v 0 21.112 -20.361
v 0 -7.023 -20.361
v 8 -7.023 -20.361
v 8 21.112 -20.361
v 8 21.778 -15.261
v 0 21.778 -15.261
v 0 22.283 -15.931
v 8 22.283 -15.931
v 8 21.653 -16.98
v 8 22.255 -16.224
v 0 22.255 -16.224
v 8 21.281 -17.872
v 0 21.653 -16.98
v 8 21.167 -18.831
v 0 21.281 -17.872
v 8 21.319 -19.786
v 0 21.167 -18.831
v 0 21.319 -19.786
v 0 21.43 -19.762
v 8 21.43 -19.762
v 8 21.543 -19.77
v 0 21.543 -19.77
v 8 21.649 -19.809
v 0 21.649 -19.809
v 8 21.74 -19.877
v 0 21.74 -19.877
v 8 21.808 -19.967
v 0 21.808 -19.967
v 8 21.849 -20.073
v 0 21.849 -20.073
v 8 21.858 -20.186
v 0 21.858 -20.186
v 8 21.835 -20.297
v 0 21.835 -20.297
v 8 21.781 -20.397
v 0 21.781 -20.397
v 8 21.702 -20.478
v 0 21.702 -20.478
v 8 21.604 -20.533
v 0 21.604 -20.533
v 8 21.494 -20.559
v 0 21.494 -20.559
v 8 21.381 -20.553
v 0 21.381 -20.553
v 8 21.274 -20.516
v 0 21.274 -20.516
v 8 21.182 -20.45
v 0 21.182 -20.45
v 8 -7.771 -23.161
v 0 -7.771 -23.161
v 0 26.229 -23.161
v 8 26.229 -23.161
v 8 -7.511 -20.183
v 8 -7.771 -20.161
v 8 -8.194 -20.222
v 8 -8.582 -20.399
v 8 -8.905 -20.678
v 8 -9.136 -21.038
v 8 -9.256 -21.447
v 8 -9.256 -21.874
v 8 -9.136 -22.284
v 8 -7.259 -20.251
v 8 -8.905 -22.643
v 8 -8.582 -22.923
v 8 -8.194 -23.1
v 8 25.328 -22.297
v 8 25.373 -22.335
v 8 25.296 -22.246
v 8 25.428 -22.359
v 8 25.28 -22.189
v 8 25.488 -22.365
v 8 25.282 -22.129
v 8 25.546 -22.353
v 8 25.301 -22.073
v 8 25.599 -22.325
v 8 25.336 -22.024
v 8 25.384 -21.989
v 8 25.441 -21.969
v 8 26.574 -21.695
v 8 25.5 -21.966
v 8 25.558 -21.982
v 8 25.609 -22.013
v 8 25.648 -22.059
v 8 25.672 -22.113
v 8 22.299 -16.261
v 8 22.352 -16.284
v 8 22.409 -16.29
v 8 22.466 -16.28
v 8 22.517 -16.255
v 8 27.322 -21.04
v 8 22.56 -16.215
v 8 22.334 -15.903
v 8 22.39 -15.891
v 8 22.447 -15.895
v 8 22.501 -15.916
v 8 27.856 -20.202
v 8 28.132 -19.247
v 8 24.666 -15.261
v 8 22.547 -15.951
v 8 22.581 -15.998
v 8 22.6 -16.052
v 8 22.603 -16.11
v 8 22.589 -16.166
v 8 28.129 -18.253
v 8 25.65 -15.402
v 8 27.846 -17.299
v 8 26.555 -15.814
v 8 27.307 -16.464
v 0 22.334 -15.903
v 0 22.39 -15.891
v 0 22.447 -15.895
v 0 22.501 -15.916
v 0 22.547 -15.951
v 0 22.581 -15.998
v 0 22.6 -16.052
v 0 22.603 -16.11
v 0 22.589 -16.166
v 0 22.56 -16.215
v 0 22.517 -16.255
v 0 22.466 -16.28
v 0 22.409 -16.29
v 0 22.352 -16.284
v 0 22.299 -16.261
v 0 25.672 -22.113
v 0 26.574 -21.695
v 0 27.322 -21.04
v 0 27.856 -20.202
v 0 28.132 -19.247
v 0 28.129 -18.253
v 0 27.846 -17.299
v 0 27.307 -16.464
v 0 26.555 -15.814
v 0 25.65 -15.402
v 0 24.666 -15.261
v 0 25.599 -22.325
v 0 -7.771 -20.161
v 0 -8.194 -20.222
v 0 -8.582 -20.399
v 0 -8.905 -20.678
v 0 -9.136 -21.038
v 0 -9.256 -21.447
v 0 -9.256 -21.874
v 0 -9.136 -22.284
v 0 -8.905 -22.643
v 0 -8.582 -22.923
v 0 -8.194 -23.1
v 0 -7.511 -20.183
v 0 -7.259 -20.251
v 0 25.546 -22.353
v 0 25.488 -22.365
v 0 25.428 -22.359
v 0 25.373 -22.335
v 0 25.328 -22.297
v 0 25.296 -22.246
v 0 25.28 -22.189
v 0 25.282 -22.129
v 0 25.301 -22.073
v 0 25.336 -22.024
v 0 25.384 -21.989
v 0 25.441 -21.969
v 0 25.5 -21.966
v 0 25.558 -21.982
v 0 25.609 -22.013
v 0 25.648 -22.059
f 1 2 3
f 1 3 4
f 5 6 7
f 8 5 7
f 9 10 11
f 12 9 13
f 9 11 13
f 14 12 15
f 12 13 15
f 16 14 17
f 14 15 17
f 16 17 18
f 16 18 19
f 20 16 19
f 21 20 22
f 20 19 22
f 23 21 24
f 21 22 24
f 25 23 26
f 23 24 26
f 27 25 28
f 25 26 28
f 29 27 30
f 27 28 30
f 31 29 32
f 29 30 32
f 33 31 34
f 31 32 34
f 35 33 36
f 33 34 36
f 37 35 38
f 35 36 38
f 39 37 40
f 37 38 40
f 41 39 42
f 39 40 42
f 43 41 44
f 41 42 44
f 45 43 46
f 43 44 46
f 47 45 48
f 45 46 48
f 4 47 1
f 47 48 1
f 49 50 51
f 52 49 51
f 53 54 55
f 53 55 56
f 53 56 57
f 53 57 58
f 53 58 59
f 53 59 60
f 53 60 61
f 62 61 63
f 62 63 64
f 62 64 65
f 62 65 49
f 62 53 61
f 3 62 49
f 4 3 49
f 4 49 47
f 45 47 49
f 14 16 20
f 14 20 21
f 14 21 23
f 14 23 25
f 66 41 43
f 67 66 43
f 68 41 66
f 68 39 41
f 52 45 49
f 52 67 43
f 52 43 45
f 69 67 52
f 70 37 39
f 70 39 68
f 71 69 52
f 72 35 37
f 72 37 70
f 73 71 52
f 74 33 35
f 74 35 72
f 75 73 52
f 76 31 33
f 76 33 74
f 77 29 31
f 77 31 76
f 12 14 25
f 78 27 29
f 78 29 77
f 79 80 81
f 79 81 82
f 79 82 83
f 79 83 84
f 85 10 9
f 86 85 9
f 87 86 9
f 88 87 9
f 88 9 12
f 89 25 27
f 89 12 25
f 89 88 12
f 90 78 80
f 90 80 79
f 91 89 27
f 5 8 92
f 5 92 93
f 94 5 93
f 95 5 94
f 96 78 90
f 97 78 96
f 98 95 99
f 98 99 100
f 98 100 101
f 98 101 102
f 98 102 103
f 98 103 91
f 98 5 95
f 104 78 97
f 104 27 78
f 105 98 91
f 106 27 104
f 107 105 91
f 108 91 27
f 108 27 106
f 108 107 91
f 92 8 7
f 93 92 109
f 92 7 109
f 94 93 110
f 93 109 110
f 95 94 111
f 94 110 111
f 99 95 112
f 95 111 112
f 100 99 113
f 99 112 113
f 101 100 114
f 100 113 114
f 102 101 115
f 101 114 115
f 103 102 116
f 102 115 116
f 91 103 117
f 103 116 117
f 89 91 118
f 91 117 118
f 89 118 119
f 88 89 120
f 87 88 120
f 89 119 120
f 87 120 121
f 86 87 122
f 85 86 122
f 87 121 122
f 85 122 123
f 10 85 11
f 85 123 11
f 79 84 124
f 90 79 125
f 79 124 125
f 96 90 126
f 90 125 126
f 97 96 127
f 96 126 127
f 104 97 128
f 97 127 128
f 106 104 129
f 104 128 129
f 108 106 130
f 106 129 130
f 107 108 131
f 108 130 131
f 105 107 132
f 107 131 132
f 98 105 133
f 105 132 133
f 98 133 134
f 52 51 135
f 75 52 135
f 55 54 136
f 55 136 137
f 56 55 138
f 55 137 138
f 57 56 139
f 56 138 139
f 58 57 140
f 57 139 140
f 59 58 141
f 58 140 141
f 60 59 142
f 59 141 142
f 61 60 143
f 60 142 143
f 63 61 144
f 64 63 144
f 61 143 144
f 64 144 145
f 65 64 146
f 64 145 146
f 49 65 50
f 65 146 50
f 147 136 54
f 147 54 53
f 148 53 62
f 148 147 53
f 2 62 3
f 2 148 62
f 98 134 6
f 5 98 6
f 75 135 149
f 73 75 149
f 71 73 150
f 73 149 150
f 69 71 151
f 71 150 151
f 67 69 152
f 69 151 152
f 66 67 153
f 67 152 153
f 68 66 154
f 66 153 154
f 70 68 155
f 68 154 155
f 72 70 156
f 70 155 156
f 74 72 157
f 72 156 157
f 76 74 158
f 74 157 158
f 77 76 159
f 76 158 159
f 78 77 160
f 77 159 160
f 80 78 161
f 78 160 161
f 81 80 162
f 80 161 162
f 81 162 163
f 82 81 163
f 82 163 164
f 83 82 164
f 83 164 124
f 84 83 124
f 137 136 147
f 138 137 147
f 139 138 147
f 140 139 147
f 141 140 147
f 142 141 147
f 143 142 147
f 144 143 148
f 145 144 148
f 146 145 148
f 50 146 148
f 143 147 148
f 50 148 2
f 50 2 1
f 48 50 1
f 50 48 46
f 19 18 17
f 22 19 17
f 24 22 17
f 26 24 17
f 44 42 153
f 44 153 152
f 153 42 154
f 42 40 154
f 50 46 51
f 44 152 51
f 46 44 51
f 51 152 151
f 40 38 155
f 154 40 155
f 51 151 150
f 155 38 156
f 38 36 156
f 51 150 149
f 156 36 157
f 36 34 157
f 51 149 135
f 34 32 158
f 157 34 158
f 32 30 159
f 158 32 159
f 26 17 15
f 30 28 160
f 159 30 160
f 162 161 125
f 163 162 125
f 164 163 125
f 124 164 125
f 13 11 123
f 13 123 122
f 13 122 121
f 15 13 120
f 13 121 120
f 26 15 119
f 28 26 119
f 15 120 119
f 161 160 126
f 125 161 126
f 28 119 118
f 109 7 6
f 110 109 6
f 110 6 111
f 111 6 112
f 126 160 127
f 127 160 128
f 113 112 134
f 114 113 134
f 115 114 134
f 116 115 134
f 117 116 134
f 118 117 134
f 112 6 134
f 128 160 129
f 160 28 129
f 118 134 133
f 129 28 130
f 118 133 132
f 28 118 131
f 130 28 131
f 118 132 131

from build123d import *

# Parameters (mm, degrees)
BOSS_EXTRUDE1_DEPTH = 8
CUT_EXTRUDE1_DEPTH  = 38.332956939


with BuildPart() as part:
    # Sketch1 → Boss-Extrude1 (new body)
    with BuildSketch(Plane.YZ):
        with BuildLine():
            Line((21.778218983, -15.260770999), (22.403447361, -16.090477082))
            ThreePointArc((22.403447361, -16.090477082), (21.256795907, -17.969098146), (21.458282303, -20.160770999))
            Line((21.458282303, -20.160770999), (-7.771266811, -20.160770999))
            ThreePointArc((-7.771266811, -20.160770999), (-9.271266811, -21.660770999), (-7.771266811, -23.160770999))
            Line((-7.771266811, -23.160770999), (26.228733189, -23.160770999))
            Line((26.228733189, -23.160770999), (25.478499604, -22.165177406))
            ThreePointArc((25.478499604, -22.165177406), (28.142104739, -18.351761478), (24.66608529, -15.260770999))
            Line((24.66608529, -15.260770999), (21.778218983, -15.260770999))
        make_face()
    extrude(amount=BOSS_EXTRUDE1_DEPTH)

    # Sketch2 → Cut-Extrude1 (cut, through all)
    with BuildSketch(Plane(origin=(0, 0, 0), x_dir=(0, -1, 0), z_dir=(-1, 0, 0))):
        with BuildLine():
            ThreePointArc((-22.283084357, -15.93074998), (-22.602512003, -16.109797243), (-22.254615534, -16.224077557))
            ThreePointArc((-22.254615534, -16.224077557), (-22.328076964, -16.156214018), (-22.403447361, -16.090477082))
            Line((-22.403447361, -16.090477082), (-22.283084357, -15.93074998))
        make_face()
        with BuildLine():
            ThreePointArc((-21.458282303, -20.160770999), (-21.383523815, -19.975180388), (-21.319492659, -19.785621116))
            ThreePointArc((-21.319492659, -19.785621116), (-21.83451901, -20.296586831), (-21.111872142, -20.360770999))
            Line((-21.111872142, -20.360770999), (-21.458282303, -20.160770999))
        make_face()
        with BuildLine():
            Line((-25.478499604, -22.165177406), (-25.598862609, -22.324904508))
            ThreePointArc((-25.598862609, -22.324904508), (-25.289362351, -22.100161258), (-25.671631303, -22.113214469))
            ThreePointArc((-25.671631303, -22.113214469), (-25.575436693, -22.140575731), (-25.478499604, -22.165177406))
        make_face()
        with BuildLine():
            ThreePointArc((7.771266811, -20.160770999), (7.383968477, -20.211633325), (7.022935334, -20.360770999))
            Line((7.022935334, -20.360770999), (-21.111872142, -20.360770999))
            Line((-21.111872142, -20.360770999), (-21.458282303, -20.160770999))
            Line((-21.458282303, -20.160770999), (7.771266811, -20.160770999))
        make_face()
        with BuildLine():
            Line((-21.319492659, -20.160770999), (-21.319492659, -19.785621116))
            ThreePointArc((-21.319492659, -19.785621116), (-21.383523815, -19.975180388), (-21.458282303, -20.160770999))
            Line((-21.458282303, -20.160770999), (-21.319492659, -20.160770999))
        make_face()
        with BuildLine():
            Line((-25.671631303, -22.113214469), (-25.598862609, -22.324904508))
            Line((-25.598862609, -22.324904508), (-25.478499604, -22.165177406))
            ThreePointArc((-25.478499604, -22.165177406), (-25.575436693, -22.140575731), (-25.671631303, -22.113214469))
        make_face()
        with BuildLine():
            ThreePointArc((-22.403447361, -16.090477082), (-22.328076964, -16.156214018), (-22.254615534, -16.224077557))
            Line((-22.254615534, -16.224077557), (-22.283084357, -15.93074998))
            Line((-22.283084357, -15.93074998), (-22.403447361, -16.090477082))
        make_face()
    extrude(amount=-CUT_EXTRUDE1_DEPTH, mode=Mode.SUBTRACT)


solid = part.part
